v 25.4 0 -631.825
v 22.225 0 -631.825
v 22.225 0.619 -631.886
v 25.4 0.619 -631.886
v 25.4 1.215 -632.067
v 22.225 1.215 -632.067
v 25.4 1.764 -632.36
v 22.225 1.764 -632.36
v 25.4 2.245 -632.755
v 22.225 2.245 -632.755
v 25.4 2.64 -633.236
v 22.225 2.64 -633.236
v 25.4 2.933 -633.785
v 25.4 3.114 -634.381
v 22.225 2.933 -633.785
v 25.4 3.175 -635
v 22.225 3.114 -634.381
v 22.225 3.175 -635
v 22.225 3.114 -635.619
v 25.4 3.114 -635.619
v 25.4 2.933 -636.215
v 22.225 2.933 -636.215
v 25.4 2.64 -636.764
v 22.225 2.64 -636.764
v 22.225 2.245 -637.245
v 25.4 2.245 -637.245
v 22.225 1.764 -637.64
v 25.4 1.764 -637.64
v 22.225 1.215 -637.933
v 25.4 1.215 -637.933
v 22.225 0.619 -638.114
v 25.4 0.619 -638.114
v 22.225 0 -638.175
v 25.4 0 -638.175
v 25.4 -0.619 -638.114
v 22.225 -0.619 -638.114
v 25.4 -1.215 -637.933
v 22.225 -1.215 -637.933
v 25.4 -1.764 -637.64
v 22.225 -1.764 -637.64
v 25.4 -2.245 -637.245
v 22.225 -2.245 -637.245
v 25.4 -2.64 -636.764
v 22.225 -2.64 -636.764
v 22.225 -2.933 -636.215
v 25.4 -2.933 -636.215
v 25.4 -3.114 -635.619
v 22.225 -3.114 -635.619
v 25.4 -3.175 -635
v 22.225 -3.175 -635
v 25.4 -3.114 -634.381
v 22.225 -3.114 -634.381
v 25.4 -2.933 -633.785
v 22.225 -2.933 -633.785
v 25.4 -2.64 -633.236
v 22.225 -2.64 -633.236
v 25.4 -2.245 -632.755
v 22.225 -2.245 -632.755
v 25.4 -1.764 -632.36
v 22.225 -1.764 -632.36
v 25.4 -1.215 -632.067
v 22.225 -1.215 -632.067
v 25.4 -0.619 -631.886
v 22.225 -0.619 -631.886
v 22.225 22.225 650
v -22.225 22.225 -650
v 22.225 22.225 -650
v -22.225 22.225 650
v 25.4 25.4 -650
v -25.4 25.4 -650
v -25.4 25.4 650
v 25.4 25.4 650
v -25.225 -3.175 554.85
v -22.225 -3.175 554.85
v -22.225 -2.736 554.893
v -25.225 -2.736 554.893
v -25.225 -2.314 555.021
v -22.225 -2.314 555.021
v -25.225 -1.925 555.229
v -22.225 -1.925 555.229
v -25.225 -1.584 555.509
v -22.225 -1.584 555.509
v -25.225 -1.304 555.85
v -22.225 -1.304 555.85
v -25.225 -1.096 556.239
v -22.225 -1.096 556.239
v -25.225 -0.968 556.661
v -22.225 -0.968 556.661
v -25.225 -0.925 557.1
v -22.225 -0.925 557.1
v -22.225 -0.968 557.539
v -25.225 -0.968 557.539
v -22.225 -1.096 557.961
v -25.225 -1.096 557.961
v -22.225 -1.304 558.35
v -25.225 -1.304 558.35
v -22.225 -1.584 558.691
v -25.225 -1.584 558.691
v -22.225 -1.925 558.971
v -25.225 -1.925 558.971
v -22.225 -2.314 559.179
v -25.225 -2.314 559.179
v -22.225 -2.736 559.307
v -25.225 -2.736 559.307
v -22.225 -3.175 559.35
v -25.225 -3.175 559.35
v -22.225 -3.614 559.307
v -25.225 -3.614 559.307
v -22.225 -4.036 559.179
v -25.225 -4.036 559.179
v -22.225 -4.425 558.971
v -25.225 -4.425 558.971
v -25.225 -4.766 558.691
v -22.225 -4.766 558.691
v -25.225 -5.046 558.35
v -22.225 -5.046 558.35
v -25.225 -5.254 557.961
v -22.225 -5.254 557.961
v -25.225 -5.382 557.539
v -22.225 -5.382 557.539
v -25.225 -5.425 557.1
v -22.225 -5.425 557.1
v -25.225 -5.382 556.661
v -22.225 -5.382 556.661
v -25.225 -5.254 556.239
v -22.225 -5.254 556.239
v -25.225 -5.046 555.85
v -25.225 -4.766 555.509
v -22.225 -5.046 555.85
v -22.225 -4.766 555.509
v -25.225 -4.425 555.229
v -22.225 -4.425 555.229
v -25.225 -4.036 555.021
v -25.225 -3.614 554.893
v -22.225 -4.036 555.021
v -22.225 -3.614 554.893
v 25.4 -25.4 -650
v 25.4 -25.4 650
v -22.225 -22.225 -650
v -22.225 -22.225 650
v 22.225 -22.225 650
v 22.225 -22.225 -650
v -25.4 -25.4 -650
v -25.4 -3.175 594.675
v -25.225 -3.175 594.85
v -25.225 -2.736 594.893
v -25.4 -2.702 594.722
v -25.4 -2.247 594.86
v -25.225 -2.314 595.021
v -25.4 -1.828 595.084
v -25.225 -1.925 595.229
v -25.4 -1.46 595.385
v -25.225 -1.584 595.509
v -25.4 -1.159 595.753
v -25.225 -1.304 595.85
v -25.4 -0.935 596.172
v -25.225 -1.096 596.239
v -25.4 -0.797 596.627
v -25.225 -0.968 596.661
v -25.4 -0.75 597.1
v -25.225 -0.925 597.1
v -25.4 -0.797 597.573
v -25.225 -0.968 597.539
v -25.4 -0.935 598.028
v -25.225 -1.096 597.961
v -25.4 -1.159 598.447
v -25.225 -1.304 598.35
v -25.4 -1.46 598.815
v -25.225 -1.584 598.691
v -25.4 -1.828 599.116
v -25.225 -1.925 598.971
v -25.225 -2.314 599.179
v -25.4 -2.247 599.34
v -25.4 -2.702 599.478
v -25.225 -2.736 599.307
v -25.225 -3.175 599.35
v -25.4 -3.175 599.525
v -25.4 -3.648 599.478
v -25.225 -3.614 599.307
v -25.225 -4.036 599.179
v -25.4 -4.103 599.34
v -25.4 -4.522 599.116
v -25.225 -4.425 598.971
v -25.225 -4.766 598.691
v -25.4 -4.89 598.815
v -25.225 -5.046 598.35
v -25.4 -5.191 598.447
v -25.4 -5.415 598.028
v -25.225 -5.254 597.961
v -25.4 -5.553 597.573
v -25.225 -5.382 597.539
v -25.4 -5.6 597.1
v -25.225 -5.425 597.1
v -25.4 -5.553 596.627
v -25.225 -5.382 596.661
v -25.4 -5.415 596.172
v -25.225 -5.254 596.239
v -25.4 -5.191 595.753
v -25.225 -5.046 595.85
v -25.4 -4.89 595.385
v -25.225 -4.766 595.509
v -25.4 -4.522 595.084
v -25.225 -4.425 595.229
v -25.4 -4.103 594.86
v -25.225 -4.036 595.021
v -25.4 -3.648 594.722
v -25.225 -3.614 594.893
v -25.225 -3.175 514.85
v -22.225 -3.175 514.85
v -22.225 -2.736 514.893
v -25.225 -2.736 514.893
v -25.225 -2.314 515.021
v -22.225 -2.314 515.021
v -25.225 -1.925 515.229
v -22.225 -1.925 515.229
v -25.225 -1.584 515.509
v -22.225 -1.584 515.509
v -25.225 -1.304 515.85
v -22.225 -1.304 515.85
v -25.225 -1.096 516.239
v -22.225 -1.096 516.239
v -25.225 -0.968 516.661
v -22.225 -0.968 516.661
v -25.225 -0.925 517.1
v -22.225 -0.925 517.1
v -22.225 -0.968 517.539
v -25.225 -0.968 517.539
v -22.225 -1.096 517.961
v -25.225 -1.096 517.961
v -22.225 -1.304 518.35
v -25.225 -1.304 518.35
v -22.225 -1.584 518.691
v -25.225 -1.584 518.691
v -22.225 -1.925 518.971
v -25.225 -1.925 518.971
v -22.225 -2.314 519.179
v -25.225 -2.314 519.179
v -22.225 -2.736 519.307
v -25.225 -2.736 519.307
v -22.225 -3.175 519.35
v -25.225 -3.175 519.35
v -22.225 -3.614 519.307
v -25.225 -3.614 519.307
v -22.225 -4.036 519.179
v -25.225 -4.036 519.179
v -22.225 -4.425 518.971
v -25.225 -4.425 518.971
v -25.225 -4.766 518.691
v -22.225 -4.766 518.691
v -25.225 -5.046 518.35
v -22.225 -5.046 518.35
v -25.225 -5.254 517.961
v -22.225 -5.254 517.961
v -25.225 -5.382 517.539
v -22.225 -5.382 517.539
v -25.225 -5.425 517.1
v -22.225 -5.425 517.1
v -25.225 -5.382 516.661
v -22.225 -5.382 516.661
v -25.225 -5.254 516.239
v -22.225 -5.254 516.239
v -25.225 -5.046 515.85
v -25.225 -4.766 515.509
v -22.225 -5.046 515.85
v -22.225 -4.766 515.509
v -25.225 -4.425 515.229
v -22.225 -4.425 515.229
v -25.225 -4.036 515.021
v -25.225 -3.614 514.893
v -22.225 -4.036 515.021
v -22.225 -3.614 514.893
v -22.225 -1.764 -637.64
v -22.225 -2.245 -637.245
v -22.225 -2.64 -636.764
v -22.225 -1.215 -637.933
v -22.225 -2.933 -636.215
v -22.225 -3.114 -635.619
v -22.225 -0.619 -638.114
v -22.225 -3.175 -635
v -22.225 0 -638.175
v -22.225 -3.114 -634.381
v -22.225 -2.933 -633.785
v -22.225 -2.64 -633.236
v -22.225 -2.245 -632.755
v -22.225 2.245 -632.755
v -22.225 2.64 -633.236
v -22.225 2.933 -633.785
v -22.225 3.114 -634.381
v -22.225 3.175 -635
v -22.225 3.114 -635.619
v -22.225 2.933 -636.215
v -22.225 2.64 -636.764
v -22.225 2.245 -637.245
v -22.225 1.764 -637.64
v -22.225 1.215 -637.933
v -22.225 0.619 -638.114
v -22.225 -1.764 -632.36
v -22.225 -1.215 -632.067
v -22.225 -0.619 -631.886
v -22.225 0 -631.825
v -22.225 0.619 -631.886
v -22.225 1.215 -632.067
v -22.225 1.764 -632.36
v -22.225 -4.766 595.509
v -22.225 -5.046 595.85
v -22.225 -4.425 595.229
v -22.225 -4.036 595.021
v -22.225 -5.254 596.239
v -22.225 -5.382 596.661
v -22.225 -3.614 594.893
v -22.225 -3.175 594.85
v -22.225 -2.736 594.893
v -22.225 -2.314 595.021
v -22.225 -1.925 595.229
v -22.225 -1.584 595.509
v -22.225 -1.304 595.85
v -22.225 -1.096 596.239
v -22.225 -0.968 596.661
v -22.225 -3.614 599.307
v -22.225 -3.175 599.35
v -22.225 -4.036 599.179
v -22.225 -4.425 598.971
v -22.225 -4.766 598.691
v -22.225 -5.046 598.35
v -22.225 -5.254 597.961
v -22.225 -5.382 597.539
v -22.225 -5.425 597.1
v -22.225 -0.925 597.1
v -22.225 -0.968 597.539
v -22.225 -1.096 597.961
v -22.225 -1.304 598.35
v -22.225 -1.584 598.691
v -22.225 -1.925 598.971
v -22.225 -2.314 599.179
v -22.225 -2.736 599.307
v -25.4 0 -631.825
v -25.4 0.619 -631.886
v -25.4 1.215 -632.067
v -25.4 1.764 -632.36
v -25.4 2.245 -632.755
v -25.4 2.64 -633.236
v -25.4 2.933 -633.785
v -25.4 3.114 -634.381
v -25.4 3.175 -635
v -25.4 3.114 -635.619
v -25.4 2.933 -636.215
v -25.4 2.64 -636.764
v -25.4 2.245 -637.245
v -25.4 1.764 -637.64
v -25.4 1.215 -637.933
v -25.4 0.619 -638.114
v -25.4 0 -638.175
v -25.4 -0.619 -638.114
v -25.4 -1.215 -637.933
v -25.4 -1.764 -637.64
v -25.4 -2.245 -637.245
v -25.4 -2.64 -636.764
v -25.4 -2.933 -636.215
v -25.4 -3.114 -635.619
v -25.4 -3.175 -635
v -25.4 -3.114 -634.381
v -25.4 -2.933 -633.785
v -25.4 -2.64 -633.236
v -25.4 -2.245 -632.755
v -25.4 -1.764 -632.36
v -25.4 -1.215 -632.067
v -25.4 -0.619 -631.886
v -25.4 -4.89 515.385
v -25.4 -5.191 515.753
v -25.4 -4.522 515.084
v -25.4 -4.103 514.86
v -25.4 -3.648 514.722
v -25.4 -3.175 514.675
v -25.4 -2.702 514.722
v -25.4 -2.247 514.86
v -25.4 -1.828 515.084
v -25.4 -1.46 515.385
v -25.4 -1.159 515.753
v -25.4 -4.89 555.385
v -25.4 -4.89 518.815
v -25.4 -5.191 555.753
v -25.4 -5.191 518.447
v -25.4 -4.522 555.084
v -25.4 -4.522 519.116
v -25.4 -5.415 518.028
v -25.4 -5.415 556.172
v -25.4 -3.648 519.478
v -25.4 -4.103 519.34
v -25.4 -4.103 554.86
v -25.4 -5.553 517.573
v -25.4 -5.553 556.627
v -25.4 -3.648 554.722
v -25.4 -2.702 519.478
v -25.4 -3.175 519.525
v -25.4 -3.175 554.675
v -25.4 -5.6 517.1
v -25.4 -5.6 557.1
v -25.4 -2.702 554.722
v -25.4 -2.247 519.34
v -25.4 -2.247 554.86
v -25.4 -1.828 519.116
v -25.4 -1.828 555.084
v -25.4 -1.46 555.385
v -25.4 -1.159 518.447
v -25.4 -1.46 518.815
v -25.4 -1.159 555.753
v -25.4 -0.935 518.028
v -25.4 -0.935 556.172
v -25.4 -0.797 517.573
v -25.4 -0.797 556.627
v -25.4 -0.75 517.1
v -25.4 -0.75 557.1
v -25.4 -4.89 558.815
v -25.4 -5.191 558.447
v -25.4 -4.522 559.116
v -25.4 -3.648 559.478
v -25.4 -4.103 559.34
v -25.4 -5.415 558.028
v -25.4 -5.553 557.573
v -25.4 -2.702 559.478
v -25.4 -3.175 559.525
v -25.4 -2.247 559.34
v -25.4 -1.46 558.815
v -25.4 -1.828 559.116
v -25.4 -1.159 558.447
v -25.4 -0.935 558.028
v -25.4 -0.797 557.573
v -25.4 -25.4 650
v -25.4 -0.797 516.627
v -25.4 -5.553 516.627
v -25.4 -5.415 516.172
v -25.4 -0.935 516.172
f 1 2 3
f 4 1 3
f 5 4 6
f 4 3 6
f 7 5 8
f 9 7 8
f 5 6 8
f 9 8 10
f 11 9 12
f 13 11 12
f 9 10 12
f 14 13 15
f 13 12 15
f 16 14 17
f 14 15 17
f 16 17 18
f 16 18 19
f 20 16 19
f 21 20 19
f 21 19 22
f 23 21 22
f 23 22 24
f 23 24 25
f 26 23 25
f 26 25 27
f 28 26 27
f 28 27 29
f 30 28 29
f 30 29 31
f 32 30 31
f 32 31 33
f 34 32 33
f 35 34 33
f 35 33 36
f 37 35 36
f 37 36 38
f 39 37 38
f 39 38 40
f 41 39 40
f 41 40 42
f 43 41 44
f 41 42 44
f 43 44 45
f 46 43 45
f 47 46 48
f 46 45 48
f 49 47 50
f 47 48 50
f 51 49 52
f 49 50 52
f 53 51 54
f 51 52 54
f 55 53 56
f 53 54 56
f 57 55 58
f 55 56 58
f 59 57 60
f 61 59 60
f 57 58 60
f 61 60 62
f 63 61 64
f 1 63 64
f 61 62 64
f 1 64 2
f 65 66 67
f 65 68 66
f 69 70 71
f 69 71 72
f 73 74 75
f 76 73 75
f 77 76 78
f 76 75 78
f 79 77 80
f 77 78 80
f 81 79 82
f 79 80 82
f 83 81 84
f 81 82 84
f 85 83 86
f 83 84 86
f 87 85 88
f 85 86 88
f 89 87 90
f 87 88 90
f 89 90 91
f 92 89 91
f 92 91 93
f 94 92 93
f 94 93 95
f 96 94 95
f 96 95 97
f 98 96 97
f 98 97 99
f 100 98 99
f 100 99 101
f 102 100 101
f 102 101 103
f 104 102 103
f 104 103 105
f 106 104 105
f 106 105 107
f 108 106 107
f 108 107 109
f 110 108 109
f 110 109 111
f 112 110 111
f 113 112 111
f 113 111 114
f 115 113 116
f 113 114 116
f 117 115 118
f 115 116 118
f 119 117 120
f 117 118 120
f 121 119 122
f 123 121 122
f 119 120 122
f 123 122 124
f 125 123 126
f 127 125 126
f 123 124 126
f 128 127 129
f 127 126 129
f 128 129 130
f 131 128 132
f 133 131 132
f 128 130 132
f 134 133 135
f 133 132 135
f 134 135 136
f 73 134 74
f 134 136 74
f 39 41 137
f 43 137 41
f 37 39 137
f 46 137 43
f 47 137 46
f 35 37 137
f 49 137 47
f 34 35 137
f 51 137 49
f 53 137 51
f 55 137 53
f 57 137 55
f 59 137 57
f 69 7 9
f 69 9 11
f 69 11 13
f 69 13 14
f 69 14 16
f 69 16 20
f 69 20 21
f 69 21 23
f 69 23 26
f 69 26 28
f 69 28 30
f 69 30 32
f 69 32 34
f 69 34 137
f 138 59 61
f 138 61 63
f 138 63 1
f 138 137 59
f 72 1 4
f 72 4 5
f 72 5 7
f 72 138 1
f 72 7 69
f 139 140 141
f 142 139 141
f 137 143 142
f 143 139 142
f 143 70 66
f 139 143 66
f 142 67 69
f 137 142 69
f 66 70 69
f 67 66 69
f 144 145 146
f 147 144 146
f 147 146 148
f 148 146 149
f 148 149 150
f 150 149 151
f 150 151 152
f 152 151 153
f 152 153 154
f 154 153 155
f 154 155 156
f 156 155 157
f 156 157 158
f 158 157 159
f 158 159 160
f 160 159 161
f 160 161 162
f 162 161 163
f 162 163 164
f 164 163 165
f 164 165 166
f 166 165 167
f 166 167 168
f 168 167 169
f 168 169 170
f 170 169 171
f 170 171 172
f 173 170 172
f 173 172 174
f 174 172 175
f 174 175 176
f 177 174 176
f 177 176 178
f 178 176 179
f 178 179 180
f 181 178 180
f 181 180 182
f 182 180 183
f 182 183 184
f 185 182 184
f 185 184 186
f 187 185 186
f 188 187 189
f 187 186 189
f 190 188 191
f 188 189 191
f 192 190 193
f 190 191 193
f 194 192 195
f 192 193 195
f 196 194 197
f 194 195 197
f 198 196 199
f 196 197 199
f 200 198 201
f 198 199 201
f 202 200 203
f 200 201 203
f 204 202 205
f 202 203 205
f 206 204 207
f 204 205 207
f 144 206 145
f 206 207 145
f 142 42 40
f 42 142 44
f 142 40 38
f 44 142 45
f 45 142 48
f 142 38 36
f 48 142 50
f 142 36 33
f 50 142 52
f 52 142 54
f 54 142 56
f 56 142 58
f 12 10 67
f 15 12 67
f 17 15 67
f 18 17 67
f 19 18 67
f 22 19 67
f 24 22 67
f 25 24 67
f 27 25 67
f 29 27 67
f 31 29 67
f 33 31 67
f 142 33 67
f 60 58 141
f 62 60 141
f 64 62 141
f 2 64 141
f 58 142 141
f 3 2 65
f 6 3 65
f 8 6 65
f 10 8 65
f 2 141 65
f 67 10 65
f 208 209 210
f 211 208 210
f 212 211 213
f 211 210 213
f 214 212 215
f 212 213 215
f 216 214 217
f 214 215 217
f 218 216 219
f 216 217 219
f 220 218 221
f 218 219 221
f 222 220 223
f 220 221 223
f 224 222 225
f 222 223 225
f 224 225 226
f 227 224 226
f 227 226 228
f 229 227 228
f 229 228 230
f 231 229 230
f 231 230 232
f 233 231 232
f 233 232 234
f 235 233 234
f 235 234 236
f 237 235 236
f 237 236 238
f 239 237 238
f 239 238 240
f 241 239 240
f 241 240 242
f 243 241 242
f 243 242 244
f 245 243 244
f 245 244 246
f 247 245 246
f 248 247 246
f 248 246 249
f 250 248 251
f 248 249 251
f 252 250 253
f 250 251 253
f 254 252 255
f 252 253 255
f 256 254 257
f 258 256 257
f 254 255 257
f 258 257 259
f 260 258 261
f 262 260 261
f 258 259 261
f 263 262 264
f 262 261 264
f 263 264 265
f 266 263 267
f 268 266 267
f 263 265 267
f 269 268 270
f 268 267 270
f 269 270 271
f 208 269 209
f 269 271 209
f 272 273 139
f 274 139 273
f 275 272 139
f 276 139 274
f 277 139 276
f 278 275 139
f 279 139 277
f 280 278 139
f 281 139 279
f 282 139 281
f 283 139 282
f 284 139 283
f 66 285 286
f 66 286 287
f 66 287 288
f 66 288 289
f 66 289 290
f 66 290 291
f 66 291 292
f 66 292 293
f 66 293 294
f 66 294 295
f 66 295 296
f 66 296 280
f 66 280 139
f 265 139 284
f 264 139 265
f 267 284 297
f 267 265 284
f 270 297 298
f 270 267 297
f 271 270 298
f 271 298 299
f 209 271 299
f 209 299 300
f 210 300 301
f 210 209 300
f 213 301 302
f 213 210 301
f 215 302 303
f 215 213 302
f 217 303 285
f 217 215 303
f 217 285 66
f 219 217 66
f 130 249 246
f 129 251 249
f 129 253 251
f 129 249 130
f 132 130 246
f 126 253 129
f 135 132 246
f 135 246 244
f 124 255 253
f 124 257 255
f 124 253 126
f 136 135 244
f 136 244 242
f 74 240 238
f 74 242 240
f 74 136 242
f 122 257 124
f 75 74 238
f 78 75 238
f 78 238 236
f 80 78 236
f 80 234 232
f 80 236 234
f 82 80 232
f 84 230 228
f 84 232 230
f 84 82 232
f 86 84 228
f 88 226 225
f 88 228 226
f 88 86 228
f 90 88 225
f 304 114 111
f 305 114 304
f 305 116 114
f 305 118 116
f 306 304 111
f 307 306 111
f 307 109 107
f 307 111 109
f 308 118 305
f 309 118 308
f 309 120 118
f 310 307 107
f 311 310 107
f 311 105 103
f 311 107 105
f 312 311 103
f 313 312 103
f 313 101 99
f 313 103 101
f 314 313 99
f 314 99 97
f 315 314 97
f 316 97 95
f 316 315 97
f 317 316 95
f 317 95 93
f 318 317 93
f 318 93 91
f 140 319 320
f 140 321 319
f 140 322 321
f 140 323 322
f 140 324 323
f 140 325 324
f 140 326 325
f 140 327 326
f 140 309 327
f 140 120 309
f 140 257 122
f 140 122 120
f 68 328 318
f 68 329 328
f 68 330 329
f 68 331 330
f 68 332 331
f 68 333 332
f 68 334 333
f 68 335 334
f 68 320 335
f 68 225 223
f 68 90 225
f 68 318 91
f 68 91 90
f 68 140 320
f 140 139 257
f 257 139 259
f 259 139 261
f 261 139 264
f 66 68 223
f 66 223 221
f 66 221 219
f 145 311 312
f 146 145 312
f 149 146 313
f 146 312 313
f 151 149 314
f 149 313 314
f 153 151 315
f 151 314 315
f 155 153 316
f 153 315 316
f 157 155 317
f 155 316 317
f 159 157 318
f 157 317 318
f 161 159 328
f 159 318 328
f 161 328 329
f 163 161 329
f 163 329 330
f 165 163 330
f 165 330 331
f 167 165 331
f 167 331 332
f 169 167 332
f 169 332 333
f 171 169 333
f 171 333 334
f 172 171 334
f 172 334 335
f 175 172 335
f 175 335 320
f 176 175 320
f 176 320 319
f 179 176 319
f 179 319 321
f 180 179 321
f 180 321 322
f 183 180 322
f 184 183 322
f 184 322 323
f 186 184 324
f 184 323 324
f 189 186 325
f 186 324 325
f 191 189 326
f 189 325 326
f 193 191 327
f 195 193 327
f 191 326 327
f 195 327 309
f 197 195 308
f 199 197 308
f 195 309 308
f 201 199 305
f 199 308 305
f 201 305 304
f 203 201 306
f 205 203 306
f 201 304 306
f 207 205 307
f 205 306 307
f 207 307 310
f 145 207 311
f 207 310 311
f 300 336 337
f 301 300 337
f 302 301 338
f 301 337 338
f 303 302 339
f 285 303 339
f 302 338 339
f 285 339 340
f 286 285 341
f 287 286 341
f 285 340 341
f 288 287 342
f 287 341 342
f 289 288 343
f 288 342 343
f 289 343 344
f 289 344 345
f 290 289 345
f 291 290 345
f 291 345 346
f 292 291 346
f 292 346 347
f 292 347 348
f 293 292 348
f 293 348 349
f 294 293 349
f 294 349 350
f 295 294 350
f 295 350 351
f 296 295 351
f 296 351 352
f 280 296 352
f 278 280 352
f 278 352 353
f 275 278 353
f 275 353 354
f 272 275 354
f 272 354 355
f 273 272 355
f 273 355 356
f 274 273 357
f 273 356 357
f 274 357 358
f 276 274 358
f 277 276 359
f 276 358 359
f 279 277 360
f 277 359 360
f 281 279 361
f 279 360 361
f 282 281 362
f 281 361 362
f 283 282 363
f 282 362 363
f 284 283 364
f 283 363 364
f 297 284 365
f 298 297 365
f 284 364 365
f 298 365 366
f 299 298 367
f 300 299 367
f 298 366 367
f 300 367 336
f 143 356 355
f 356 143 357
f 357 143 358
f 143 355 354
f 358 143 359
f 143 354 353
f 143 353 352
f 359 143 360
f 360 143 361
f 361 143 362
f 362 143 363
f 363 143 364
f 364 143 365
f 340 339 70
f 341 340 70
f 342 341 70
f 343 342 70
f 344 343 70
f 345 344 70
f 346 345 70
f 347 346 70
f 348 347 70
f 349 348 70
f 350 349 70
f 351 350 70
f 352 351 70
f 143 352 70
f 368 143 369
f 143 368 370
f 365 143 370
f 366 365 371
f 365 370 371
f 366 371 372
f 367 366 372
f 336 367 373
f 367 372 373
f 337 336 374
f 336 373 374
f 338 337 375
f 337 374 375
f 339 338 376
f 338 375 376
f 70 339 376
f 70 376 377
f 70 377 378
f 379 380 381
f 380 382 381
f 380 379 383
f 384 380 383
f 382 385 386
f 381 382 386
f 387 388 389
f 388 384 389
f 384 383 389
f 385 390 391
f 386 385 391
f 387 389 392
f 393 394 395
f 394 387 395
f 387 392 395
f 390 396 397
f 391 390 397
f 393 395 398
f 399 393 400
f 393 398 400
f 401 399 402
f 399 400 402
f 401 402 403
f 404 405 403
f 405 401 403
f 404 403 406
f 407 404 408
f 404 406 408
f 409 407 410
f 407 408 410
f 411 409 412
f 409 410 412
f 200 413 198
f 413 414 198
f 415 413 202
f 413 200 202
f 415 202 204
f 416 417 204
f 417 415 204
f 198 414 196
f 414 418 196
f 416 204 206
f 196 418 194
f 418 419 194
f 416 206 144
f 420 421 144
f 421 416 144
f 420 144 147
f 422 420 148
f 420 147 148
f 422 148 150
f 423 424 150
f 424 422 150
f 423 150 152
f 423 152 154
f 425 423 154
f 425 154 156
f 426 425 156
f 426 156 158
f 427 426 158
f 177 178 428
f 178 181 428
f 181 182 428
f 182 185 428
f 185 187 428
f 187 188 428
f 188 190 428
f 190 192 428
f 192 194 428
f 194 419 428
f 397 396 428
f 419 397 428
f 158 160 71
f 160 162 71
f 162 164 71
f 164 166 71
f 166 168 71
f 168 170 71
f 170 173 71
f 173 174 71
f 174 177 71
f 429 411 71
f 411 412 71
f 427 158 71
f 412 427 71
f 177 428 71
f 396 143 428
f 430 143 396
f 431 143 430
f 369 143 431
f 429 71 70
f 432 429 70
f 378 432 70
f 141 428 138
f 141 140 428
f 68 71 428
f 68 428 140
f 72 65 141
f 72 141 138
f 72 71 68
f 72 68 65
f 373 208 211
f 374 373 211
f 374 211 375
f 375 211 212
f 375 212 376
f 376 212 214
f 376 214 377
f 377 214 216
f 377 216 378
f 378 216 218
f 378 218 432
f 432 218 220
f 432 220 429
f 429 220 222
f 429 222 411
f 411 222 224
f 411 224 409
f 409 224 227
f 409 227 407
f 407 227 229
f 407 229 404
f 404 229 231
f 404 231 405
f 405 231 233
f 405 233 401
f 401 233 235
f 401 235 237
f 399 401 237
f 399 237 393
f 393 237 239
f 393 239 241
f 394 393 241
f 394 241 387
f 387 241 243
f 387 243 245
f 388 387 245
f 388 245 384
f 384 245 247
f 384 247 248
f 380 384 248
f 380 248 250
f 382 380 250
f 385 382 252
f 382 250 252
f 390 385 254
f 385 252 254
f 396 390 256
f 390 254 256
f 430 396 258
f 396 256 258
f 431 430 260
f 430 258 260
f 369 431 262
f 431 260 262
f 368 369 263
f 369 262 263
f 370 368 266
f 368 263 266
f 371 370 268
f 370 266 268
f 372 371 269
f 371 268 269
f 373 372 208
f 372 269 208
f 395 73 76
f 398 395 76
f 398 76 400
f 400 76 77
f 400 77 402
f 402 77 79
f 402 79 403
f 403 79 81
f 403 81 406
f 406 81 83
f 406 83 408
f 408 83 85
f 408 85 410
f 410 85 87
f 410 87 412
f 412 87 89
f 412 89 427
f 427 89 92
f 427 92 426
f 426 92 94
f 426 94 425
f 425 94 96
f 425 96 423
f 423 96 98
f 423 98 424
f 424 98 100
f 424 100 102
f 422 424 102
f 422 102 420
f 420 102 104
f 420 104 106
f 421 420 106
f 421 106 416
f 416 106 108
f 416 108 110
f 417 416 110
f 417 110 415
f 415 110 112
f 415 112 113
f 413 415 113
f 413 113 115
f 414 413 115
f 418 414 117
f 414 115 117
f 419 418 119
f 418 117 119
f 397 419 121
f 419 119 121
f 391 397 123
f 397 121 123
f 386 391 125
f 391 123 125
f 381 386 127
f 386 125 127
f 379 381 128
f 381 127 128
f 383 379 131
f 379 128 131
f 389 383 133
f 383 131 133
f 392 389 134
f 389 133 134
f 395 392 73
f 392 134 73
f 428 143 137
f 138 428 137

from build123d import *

# Parameters (mm, degrees)
ESQUISSE2_W                    = 50.8
ESQUISSE2_H                    = 50.8
ESQUISSE2_W_2                  = 44.45
ESQUISSE2_H_2                  = 44.45
BOSS_EXTRU_1_DEPTH             = 649.999999972
ESQUISSE4_R                    = 3.175
ENL_V_MAT_EXTRU_2_DEPTH        = 653.476666222
M4_CLEARANCE_HOLE1_D           = 4.5
M4_CLEARANCE_HOLE1_DEPTH       = 3.175
M4_CLEARANCE_HOLE1_CSINK_D     = 4.85
M4_CLEARANCE_HOLE1_CSINK_ANGLE = 90


with BuildPart() as part:
    # Esquisse2 → Boss.-Extru.1 (new, symmetric)
    with BuildSketch(Plane.XY):
        Rectangle(ESQUISSE2_W, ESQUISSE2_H)
        Rectangle(ESQUISSE2_W_2, ESQUISSE2_H_2, mode=Mode.SUBTRACT)
    extrude(amount=BOSS_EXTRU_1_DEPTH, both=True)

    # Esquisse4 → Enlèv. mat.-Extru.2 (cut, through all)
    with BuildSketch(Plane.ZY.offset(25.4)):
        with Locations((-634.999999972, 0)):
            Circle(ESQUISSE4_R)
    extrude(amount=-ENL_V_MAT_EXTRU_2_DEPTH, mode=Mode.SUBTRACT)

    # M4 Clearance Hole1
    with Locations(Plane.ZY.offset(25.4)):
        with Locations((517.099999972, -3.175), (557.099999972, -3.175), (597.099999972, -3.175)):
            CounterSinkHole(M4_CLEARANCE_HOLE1_D / 2, M4_CLEARANCE_HOLE1_CSINK_D / 2, depth=M4_CLEARANCE_HOLE1_DEPTH, counter_sink_angle=M4_CLEARANCE_HOLE1_CSINK_ANGLE)


solid = part.part
